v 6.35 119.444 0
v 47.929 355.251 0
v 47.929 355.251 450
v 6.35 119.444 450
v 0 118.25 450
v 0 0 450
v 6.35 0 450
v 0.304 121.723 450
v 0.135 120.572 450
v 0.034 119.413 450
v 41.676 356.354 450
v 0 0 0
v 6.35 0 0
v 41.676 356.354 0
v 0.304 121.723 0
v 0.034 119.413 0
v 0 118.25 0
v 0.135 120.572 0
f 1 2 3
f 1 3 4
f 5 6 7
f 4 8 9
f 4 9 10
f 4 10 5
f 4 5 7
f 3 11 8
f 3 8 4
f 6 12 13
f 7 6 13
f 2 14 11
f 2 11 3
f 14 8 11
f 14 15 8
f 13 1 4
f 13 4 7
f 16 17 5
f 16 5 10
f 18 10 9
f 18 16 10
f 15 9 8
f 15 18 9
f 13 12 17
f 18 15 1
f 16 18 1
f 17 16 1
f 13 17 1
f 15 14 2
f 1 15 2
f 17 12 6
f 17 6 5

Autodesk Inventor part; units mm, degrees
ref_plane "YZ Plane" through (0, 0, 0) normal (1, 0, 0) x (0, 1, 0)
ref_plane "XZ Plane" through (0, 0, 0) normal (0, 1, 0) x (-1, 0, 0)
ref_plane "XY Plane" through (0, 0, 0) normal (0, 0, 1) x (1, 0, 0)
sketch "Sketch1" plane through (0, 0, 0) normal (0, 0, 1) x (1, 0, 0)
  line L0 (0, 0) -> (0, 118.2502)
  line L1 (0.3038, 121.7232) -> (41.6756, 356.3539)
  arc A0 (0.3038, 121.7232) -> (0, 118.2502) centre (20, 118.2502) ccw
  line L2 (47.9291, 355.2512) -> (6.35, 119.4444)
  line L3 (6.35, 119.4444) -> (6.35, 0)
  line L4 (41.6756, 356.3539) -> (47.9291, 355.2512)
  line L5 (0, 0) -> (6.35, 0)
  point P0 (0, 120)
  dimension "d0" = 170
  dimension "d1" = 120
  dimension "d2" = 240
  dimension "d3" = 20
  dimension "d4" = 6.35
extrude "Extrusion1" add sketch "Sketch1" along normal blind 450
properties part number "SteelBack"
